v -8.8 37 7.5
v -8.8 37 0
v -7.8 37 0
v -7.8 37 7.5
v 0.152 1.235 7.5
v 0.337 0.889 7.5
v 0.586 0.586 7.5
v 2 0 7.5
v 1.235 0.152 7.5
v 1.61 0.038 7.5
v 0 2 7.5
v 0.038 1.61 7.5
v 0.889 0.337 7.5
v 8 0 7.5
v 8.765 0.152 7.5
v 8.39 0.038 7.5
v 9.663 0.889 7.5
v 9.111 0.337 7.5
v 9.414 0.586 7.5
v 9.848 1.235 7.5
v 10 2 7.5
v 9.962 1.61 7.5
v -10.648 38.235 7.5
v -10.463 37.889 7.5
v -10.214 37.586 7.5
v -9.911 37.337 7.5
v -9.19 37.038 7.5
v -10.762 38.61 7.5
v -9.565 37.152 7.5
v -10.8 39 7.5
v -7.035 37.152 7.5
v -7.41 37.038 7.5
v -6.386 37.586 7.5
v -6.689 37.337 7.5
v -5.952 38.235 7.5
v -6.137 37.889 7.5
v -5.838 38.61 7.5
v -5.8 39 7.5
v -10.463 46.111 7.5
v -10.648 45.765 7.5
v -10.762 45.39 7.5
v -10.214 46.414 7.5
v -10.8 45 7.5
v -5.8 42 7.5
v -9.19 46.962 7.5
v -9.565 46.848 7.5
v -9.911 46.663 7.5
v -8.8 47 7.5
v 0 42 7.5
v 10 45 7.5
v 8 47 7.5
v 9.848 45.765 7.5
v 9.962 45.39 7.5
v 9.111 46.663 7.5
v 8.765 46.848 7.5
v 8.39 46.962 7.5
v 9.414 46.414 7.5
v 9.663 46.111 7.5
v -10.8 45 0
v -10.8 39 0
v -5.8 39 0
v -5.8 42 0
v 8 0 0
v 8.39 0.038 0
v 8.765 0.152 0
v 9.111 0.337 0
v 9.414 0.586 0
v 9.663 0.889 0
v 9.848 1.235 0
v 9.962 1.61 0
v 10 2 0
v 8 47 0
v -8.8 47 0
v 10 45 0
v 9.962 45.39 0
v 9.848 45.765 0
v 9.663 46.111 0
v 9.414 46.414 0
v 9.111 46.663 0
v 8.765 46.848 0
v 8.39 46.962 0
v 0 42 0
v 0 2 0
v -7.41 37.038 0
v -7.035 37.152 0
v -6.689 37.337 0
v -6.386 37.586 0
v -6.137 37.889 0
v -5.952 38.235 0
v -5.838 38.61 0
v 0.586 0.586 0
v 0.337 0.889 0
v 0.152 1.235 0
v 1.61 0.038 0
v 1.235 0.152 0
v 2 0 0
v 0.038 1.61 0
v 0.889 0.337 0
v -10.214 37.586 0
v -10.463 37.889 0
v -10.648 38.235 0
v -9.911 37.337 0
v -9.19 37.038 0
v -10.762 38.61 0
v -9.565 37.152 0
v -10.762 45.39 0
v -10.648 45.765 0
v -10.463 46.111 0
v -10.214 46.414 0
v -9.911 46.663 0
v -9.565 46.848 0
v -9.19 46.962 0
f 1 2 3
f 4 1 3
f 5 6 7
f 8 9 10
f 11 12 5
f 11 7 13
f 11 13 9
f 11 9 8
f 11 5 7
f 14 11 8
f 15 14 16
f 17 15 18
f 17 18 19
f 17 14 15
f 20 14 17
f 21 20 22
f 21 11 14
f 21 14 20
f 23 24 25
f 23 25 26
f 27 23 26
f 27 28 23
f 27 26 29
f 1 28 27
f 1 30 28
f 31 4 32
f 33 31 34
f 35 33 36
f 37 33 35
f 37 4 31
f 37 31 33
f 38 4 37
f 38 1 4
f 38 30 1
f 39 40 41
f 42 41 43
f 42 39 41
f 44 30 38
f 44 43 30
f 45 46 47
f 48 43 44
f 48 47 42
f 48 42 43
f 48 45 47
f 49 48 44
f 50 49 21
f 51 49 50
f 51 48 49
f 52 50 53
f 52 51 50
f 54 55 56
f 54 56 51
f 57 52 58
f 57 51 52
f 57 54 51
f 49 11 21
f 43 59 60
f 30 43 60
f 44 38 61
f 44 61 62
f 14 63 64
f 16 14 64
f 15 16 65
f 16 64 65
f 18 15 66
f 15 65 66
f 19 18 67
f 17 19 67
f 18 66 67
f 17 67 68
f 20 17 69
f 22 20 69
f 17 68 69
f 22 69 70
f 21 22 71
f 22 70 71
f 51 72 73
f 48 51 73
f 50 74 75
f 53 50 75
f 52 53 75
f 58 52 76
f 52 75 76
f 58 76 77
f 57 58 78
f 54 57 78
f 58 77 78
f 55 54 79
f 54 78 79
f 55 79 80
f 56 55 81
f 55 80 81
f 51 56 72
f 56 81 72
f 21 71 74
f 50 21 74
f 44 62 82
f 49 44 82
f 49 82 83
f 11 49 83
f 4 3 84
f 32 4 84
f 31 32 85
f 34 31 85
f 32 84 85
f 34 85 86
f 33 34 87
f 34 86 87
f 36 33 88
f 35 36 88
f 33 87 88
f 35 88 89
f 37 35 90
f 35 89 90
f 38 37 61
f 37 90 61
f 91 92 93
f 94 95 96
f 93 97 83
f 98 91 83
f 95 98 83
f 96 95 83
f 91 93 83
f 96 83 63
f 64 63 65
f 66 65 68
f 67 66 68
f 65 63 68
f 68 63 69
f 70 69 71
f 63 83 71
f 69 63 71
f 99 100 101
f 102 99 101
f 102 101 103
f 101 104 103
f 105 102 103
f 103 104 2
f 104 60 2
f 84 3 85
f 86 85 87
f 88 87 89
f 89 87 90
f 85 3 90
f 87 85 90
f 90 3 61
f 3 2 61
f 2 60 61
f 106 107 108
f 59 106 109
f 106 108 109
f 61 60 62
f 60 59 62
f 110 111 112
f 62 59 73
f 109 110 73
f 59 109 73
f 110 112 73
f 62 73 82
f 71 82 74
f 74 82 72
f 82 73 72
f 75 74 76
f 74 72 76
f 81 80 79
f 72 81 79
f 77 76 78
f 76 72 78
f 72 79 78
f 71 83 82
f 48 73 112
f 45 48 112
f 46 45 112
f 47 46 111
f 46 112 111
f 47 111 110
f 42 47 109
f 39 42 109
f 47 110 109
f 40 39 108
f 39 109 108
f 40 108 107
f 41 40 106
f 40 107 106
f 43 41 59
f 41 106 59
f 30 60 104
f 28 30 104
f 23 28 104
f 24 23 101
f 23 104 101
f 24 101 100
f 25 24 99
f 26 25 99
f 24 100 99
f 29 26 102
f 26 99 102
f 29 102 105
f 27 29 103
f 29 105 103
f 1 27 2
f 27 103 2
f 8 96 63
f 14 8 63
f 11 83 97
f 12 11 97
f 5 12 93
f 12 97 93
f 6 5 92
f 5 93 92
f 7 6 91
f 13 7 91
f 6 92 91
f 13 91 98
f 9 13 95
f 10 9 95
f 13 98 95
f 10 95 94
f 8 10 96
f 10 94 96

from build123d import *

# Parameters (mm, degrees)
F1_DEPTH = 7.5


with BuildPart() as f1:
    # F0 (on Top) → F1 (new body)
    with BuildSketch(Plane.XY):
        with BuildLine():
            ThreePointArc((0, 2), (0.585786, 0.585786), (2, 0))
            Line((2, 0), (8, 0))
            ThreePointArc((8, 0), (9.414214, 0.585786), (10, 2))
            Line((10, 2), (10, 45))
            ThreePointArc((10, 45), (9.414214, 46.414214), (8, 47))
            Line((8, 47), (-8.8, 47))
            ThreePointArc((-8.8, 47), (-10.214214, 46.414214), (-10.8, 45))
            Line((-10.8, 45), (-10.8, 39))
            ThreePointArc((-10.8, 39), (-10.214214, 37.585786), (-8.8, 37))
            Line((-8.8, 37), (-7.8, 37))
            ThreePointArc((-7.8, 37), (-6.385786, 37.585786), (-5.8, 39))
            Line((-5.8, 39), (-5.8, 42))
            Line((-5.8, 42), (0, 42))
            Line((0, 42), (0, 2))
        make_face()
    extrude(amount=F1_DEPTH)


solid = f1.part
